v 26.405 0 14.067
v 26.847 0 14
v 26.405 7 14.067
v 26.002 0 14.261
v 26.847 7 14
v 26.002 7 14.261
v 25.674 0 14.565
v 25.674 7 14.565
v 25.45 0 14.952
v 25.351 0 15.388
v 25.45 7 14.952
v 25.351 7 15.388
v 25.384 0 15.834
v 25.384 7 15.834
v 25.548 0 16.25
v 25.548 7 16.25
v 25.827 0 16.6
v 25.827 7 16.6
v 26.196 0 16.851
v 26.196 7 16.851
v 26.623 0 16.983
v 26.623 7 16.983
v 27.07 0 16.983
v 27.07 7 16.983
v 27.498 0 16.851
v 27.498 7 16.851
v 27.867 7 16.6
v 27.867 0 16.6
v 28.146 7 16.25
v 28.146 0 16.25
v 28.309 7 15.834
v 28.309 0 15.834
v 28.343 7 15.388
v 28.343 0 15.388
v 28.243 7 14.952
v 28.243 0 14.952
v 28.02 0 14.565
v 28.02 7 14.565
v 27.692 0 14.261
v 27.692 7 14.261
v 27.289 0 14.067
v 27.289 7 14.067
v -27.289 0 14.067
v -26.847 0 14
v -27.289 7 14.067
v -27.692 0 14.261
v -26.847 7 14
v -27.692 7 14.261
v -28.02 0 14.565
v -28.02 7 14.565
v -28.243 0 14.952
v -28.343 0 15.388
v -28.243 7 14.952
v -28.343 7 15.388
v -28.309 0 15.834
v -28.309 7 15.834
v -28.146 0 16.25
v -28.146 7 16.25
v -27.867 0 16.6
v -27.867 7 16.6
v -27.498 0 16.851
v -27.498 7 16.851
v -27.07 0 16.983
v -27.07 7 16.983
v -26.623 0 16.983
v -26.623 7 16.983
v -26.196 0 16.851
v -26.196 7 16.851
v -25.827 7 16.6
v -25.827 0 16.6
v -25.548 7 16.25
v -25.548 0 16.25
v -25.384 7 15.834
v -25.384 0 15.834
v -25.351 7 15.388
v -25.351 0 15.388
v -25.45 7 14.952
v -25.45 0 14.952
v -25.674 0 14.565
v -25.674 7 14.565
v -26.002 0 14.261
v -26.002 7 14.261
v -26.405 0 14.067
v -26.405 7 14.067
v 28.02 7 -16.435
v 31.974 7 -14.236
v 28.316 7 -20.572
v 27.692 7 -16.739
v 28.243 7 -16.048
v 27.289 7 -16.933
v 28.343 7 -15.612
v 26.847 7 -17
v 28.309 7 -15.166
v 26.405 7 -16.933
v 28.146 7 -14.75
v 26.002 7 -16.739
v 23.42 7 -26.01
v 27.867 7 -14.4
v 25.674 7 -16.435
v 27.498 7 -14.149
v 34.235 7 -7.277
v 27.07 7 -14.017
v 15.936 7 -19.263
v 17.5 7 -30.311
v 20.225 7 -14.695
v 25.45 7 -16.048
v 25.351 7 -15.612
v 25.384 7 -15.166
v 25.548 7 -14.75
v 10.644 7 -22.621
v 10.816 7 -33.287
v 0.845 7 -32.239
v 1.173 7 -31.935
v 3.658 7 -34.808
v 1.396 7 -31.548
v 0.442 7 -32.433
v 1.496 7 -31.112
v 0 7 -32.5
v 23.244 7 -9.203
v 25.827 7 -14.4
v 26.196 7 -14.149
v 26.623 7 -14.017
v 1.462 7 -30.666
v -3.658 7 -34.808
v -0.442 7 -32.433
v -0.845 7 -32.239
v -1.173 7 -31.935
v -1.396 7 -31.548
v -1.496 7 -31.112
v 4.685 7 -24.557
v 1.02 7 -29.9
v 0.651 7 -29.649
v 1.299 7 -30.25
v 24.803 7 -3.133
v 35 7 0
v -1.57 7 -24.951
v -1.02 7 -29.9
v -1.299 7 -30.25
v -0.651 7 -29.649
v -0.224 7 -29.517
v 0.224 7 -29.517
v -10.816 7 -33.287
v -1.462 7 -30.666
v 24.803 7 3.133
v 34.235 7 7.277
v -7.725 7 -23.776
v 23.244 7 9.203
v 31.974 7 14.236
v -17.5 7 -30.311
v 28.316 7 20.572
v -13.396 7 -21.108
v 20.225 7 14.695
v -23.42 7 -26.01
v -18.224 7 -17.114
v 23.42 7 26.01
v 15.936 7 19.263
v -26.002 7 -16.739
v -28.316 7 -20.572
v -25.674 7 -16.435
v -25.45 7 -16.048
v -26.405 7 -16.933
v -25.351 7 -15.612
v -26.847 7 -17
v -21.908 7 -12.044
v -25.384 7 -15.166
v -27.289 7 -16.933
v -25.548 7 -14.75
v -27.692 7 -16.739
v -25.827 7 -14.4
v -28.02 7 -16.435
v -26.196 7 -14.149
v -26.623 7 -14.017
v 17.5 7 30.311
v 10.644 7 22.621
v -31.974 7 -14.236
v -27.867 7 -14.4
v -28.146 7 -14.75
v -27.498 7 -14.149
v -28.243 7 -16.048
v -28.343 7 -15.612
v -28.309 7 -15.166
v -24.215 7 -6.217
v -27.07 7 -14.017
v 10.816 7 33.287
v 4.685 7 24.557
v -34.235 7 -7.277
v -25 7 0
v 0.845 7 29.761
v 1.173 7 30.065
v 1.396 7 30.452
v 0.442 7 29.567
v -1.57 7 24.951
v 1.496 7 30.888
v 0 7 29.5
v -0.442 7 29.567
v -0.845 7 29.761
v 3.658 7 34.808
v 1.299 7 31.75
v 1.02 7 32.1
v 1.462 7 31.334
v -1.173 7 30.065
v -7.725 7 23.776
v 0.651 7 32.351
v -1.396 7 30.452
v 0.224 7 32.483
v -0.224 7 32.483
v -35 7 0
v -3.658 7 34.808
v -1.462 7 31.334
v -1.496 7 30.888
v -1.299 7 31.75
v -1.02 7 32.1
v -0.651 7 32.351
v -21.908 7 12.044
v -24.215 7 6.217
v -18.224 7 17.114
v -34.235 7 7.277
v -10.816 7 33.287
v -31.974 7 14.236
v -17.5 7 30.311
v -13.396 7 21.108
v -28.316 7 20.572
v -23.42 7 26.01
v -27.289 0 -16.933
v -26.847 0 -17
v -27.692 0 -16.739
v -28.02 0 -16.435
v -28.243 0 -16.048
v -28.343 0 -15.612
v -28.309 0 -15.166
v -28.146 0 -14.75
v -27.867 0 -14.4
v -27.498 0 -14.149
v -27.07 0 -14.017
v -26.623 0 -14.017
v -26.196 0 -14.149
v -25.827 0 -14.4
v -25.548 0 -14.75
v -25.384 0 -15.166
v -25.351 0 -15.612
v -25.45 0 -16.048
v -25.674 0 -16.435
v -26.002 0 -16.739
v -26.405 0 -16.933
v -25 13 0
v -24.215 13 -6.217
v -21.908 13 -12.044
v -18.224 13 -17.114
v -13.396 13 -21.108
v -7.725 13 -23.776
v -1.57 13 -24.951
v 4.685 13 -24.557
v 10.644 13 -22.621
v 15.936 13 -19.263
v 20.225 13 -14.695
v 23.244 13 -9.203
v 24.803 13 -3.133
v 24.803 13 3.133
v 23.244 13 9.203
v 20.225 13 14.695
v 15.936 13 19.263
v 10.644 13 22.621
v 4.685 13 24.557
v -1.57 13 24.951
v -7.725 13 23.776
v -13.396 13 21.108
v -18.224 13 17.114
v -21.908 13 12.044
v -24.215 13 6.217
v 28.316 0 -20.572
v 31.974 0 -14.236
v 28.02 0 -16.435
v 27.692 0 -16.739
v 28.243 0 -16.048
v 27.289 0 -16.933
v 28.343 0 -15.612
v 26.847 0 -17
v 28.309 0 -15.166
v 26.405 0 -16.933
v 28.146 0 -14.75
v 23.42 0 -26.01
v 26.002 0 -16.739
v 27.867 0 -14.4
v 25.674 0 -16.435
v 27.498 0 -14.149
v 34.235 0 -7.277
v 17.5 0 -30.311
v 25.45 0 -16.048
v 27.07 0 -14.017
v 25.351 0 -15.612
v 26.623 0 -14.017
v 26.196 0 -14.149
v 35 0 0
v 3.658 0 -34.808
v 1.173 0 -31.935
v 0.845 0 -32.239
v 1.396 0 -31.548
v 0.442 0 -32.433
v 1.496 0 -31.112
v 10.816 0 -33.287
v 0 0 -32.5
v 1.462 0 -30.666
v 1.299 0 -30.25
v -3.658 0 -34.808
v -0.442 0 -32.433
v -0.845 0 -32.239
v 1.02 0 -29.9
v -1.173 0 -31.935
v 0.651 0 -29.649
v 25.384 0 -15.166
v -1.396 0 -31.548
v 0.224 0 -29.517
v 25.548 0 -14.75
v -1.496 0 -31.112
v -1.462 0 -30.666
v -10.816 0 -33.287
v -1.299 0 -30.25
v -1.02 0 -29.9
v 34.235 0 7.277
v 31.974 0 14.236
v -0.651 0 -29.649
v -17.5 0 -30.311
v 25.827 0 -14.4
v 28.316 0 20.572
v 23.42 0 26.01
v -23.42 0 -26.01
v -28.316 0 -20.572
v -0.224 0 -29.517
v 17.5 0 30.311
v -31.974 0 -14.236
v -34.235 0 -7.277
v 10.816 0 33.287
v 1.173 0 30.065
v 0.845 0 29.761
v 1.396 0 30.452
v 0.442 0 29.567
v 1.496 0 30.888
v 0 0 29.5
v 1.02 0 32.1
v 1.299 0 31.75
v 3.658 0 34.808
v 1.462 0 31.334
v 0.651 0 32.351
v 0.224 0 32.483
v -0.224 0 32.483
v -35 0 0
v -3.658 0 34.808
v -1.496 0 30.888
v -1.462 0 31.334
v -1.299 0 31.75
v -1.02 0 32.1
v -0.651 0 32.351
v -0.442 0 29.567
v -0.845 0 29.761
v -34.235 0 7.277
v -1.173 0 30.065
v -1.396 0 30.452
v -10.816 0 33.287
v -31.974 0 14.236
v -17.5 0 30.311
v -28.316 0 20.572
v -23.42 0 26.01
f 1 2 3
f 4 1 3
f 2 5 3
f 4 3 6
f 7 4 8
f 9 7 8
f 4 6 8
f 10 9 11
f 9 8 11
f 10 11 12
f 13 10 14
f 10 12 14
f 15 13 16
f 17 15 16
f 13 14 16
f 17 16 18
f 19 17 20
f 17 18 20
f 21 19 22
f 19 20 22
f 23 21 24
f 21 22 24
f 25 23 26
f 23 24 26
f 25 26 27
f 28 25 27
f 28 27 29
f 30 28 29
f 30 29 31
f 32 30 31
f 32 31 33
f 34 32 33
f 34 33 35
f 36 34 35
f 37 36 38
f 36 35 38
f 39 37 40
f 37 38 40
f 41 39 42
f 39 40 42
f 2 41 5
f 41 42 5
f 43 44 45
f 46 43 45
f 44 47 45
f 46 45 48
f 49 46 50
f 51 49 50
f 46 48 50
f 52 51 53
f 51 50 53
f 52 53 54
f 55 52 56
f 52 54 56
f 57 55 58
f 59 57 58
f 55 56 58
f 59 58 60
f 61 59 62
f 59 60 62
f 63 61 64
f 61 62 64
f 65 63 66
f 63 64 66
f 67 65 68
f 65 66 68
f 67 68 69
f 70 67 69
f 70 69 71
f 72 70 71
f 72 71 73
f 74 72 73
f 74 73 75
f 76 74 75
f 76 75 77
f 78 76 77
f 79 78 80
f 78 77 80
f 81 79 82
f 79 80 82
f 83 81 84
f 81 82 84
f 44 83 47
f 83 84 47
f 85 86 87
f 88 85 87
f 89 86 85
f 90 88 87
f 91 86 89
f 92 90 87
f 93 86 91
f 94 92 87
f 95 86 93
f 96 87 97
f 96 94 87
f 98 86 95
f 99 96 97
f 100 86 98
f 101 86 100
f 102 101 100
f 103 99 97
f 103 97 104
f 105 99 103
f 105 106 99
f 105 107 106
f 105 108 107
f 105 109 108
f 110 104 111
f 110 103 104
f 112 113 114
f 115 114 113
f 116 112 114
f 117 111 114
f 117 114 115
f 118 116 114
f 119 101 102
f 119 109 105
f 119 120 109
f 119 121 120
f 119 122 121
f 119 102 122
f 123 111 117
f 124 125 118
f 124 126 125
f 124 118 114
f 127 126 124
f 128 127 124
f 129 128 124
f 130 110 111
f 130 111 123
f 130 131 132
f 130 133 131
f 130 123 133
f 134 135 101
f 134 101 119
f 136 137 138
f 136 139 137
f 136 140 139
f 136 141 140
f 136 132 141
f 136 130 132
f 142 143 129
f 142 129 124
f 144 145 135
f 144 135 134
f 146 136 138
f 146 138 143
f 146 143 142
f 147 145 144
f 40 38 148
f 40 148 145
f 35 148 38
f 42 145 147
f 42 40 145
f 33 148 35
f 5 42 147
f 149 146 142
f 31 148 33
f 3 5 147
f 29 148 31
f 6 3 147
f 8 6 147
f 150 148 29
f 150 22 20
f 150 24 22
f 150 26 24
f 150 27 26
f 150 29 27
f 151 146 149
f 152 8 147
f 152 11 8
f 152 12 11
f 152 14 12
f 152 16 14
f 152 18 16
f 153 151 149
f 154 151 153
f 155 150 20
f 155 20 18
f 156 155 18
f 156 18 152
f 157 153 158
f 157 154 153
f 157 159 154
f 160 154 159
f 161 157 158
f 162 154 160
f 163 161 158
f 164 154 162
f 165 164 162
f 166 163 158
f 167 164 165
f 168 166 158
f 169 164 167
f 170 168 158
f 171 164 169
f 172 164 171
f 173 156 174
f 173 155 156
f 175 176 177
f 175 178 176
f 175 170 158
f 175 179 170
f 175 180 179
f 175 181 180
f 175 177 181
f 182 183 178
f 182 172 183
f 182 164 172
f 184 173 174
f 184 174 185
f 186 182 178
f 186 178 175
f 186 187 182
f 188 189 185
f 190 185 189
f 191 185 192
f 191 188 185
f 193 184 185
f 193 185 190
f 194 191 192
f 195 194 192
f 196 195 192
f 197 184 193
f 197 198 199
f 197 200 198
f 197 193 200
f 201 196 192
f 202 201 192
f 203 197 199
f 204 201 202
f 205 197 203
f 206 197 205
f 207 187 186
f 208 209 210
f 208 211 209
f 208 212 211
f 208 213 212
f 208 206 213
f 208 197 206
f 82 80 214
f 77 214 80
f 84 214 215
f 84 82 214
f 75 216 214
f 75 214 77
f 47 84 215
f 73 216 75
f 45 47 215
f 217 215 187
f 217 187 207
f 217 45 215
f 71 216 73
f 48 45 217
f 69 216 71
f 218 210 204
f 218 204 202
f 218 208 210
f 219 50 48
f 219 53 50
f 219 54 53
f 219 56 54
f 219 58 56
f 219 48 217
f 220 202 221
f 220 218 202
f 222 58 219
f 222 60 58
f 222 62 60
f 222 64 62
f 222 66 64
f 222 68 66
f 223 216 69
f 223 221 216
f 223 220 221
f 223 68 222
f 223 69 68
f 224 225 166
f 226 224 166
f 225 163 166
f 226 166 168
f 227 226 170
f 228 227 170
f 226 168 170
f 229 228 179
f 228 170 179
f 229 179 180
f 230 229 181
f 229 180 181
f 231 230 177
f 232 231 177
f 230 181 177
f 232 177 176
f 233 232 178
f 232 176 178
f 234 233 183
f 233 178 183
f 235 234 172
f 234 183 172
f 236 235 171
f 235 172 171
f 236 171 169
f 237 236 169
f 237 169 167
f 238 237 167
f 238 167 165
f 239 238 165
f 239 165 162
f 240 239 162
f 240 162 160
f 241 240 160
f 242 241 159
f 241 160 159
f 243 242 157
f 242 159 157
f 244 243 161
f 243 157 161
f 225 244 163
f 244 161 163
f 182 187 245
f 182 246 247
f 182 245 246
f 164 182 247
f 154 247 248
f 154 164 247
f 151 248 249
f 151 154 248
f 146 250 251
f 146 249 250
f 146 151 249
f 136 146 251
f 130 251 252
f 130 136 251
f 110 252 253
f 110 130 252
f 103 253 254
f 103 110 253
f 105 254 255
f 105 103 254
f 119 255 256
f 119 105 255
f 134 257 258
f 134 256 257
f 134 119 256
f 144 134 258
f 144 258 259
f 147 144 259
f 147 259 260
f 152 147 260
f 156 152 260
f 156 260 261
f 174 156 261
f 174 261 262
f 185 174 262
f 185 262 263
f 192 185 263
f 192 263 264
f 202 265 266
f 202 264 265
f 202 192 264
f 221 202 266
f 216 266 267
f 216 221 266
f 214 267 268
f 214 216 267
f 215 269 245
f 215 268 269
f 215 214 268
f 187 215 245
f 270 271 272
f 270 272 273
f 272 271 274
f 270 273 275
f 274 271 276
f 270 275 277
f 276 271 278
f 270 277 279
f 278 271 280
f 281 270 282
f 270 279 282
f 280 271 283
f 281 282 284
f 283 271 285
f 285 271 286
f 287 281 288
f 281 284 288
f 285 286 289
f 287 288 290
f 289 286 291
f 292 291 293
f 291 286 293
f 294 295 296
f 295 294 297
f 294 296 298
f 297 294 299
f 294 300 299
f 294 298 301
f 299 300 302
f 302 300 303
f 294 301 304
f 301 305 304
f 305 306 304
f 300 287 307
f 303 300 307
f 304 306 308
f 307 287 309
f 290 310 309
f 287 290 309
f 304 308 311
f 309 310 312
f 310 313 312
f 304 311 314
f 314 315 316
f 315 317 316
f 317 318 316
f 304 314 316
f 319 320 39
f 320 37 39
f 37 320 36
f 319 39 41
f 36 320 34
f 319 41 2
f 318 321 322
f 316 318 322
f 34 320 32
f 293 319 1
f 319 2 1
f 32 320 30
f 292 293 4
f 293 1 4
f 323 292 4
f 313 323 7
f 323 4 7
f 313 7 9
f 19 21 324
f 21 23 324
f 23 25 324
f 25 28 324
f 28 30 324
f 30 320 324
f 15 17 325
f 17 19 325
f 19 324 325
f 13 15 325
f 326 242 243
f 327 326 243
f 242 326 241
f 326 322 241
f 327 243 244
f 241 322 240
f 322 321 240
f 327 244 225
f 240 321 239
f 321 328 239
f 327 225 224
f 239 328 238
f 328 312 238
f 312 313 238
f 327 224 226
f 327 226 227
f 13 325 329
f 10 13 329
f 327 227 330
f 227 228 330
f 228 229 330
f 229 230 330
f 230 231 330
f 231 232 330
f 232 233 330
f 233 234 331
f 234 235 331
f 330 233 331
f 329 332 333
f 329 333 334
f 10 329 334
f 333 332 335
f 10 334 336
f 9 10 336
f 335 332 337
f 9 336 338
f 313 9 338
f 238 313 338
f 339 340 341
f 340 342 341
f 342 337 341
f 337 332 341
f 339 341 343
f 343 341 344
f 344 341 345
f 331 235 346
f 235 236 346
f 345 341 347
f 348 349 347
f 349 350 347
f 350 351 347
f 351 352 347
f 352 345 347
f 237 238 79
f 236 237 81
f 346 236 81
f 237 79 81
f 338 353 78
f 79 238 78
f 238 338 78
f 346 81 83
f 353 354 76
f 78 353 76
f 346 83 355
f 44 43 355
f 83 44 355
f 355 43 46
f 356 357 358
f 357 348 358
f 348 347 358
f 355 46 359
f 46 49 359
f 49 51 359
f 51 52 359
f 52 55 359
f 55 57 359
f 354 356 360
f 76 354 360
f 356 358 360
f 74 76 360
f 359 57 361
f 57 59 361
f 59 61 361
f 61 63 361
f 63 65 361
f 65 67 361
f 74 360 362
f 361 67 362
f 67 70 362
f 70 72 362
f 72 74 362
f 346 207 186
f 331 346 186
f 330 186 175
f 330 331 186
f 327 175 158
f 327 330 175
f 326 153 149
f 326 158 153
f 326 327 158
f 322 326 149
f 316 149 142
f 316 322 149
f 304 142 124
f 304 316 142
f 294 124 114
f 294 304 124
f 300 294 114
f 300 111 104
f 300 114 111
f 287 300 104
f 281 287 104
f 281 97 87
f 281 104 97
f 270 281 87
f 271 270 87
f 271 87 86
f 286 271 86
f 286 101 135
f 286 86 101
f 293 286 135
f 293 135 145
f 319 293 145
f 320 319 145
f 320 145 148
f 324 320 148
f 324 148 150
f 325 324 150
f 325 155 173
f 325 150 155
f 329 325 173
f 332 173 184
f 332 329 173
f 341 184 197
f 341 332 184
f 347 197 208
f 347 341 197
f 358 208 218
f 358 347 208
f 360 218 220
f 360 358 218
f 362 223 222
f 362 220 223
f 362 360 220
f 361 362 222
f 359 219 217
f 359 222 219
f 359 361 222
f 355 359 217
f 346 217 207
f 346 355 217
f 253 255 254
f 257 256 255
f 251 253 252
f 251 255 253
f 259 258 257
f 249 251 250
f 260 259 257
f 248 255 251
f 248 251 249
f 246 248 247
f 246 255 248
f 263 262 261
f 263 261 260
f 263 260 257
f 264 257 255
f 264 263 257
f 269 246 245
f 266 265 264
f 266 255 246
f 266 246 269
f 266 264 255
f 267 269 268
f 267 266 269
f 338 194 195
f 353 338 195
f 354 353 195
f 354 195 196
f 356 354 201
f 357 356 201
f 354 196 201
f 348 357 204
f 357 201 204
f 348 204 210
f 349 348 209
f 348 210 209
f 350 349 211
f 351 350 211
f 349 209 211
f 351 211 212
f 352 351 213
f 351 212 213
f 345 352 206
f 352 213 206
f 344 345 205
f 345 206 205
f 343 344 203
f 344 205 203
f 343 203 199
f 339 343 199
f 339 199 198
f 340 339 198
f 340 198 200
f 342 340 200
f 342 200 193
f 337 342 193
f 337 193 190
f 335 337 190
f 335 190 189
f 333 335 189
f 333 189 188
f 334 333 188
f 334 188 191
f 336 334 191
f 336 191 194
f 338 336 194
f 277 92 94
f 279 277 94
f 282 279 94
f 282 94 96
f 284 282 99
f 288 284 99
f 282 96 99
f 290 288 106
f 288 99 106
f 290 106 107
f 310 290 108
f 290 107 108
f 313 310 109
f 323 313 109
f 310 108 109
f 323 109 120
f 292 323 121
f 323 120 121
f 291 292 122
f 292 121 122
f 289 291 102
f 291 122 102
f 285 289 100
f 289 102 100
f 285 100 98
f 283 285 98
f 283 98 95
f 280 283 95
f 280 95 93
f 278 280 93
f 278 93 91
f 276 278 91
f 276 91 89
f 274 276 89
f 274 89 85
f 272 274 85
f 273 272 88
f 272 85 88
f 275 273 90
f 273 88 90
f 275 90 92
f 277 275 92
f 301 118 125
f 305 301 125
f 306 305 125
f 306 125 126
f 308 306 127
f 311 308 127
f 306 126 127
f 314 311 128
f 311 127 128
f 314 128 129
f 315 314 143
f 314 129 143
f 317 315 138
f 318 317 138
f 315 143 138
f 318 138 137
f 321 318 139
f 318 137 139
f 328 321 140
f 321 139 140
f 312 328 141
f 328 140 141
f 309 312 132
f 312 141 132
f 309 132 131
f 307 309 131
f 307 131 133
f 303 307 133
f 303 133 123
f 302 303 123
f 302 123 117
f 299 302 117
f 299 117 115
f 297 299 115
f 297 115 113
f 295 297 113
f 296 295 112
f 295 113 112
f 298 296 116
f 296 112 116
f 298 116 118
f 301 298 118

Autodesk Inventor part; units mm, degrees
ref_plane "YZ Plane" through (0, 0, 0) normal (1, 0, 0) x (0, 1, 0)
ref_plane "XZ Plane" through (0, 0, 0) normal (0, 1, 0) x (-1, 0, 0)
ref_plane "XY Plane" through (0, 0, 0) normal (0, 0, 1) x (1, 0, 0)
sketch "Sketch1" plane through (0, 0, 0) normal (0, 1, 0) x (-1, 0, 0)
  circle A0 centre (0, 0) radius 35
  circle A1 centre (0, 0) radius 25
  dimension "d1" = 70
  dimension "d2" = 50
sketch "Sketch2" plane through (0, 0, 0) normal (0, 1, 0) x (-1, 0, 0)
  circle A0 centre (0, 0) radius 25
  circle A1 centre (0, 0) radius 35
  dimension "d3" = 50
  dimension "d4" = 70
extrude "Extrusion1" add sketch "Sketch1" along normal blind 7
extrude "Extrusion2" add sketch "Sketch2" along normal blind 13 contours A0
sketch "Sketch3" plane through (0, 0, 0) normal (0, -1, 0) x (1, 0, 0)
  line L0 (0, 0) -> (0, -35)
  circle A0 centre (0, 0) radius 35 projected
  line L1 (0, 35) -> (0, 0)
  line L2 (30.3109, -17.5) -> (0, -35)
  line L3 (0, -35) -> (-30.3109, -17.5)
  line L4 (-30.3109, -17.5) -> (-30.3109, 17.5)
  line L5 (-30.3109, 17.5) -> (0, 35)
  line L6 (0, 35) -> (30.3109, 17.5)
  line L7 (30.3109, 17.5) -> (30.3109, -17.5)
  line L8 (0, 0) -> (30.3109, 17.5)
  line L9 (0, 0) -> (0, 35)
  line L10 (0, 0) -> (-30.3109, 17.5)
  line L11 (0, 0) -> (-30.3109, -17.5)
  line L12 (0, 0) -> (0, -35)
  line L13 (0, 0) -> (30.3109, -17.5)
  line L14 (30.3109, 17.5) -> (26.8468, 15.5)
  line L15 (26.8468, 15.5) -> (26.8468, -15.5)
  line L16 (0, -35) -> (0, -31)
  line L17 (-30.3109, -17.5) -> (-26.8468, -15.5)
  line L18 (0, 35) -> (0, 31)
  line L19 (-30.3109, 17.5) -> (-26.8468, 15.5)
  dimension "d9" = 4
  dimension "d10" = 4
  dimension "d11" = 4
  dimension "d12" = 4
  dimension "d13" = 4
hole "Hole1" at (26.8468, 0, 15.5) at (26.8468, 0, -15.5) at (0, 0, -31) at (-26.8468, 0, -15.5) at (-26.8468, 0, 15.5) at (0, 0, 31) direction (0, 1, 0) diameter 3 end through all
properties part number "bat_endcap"
